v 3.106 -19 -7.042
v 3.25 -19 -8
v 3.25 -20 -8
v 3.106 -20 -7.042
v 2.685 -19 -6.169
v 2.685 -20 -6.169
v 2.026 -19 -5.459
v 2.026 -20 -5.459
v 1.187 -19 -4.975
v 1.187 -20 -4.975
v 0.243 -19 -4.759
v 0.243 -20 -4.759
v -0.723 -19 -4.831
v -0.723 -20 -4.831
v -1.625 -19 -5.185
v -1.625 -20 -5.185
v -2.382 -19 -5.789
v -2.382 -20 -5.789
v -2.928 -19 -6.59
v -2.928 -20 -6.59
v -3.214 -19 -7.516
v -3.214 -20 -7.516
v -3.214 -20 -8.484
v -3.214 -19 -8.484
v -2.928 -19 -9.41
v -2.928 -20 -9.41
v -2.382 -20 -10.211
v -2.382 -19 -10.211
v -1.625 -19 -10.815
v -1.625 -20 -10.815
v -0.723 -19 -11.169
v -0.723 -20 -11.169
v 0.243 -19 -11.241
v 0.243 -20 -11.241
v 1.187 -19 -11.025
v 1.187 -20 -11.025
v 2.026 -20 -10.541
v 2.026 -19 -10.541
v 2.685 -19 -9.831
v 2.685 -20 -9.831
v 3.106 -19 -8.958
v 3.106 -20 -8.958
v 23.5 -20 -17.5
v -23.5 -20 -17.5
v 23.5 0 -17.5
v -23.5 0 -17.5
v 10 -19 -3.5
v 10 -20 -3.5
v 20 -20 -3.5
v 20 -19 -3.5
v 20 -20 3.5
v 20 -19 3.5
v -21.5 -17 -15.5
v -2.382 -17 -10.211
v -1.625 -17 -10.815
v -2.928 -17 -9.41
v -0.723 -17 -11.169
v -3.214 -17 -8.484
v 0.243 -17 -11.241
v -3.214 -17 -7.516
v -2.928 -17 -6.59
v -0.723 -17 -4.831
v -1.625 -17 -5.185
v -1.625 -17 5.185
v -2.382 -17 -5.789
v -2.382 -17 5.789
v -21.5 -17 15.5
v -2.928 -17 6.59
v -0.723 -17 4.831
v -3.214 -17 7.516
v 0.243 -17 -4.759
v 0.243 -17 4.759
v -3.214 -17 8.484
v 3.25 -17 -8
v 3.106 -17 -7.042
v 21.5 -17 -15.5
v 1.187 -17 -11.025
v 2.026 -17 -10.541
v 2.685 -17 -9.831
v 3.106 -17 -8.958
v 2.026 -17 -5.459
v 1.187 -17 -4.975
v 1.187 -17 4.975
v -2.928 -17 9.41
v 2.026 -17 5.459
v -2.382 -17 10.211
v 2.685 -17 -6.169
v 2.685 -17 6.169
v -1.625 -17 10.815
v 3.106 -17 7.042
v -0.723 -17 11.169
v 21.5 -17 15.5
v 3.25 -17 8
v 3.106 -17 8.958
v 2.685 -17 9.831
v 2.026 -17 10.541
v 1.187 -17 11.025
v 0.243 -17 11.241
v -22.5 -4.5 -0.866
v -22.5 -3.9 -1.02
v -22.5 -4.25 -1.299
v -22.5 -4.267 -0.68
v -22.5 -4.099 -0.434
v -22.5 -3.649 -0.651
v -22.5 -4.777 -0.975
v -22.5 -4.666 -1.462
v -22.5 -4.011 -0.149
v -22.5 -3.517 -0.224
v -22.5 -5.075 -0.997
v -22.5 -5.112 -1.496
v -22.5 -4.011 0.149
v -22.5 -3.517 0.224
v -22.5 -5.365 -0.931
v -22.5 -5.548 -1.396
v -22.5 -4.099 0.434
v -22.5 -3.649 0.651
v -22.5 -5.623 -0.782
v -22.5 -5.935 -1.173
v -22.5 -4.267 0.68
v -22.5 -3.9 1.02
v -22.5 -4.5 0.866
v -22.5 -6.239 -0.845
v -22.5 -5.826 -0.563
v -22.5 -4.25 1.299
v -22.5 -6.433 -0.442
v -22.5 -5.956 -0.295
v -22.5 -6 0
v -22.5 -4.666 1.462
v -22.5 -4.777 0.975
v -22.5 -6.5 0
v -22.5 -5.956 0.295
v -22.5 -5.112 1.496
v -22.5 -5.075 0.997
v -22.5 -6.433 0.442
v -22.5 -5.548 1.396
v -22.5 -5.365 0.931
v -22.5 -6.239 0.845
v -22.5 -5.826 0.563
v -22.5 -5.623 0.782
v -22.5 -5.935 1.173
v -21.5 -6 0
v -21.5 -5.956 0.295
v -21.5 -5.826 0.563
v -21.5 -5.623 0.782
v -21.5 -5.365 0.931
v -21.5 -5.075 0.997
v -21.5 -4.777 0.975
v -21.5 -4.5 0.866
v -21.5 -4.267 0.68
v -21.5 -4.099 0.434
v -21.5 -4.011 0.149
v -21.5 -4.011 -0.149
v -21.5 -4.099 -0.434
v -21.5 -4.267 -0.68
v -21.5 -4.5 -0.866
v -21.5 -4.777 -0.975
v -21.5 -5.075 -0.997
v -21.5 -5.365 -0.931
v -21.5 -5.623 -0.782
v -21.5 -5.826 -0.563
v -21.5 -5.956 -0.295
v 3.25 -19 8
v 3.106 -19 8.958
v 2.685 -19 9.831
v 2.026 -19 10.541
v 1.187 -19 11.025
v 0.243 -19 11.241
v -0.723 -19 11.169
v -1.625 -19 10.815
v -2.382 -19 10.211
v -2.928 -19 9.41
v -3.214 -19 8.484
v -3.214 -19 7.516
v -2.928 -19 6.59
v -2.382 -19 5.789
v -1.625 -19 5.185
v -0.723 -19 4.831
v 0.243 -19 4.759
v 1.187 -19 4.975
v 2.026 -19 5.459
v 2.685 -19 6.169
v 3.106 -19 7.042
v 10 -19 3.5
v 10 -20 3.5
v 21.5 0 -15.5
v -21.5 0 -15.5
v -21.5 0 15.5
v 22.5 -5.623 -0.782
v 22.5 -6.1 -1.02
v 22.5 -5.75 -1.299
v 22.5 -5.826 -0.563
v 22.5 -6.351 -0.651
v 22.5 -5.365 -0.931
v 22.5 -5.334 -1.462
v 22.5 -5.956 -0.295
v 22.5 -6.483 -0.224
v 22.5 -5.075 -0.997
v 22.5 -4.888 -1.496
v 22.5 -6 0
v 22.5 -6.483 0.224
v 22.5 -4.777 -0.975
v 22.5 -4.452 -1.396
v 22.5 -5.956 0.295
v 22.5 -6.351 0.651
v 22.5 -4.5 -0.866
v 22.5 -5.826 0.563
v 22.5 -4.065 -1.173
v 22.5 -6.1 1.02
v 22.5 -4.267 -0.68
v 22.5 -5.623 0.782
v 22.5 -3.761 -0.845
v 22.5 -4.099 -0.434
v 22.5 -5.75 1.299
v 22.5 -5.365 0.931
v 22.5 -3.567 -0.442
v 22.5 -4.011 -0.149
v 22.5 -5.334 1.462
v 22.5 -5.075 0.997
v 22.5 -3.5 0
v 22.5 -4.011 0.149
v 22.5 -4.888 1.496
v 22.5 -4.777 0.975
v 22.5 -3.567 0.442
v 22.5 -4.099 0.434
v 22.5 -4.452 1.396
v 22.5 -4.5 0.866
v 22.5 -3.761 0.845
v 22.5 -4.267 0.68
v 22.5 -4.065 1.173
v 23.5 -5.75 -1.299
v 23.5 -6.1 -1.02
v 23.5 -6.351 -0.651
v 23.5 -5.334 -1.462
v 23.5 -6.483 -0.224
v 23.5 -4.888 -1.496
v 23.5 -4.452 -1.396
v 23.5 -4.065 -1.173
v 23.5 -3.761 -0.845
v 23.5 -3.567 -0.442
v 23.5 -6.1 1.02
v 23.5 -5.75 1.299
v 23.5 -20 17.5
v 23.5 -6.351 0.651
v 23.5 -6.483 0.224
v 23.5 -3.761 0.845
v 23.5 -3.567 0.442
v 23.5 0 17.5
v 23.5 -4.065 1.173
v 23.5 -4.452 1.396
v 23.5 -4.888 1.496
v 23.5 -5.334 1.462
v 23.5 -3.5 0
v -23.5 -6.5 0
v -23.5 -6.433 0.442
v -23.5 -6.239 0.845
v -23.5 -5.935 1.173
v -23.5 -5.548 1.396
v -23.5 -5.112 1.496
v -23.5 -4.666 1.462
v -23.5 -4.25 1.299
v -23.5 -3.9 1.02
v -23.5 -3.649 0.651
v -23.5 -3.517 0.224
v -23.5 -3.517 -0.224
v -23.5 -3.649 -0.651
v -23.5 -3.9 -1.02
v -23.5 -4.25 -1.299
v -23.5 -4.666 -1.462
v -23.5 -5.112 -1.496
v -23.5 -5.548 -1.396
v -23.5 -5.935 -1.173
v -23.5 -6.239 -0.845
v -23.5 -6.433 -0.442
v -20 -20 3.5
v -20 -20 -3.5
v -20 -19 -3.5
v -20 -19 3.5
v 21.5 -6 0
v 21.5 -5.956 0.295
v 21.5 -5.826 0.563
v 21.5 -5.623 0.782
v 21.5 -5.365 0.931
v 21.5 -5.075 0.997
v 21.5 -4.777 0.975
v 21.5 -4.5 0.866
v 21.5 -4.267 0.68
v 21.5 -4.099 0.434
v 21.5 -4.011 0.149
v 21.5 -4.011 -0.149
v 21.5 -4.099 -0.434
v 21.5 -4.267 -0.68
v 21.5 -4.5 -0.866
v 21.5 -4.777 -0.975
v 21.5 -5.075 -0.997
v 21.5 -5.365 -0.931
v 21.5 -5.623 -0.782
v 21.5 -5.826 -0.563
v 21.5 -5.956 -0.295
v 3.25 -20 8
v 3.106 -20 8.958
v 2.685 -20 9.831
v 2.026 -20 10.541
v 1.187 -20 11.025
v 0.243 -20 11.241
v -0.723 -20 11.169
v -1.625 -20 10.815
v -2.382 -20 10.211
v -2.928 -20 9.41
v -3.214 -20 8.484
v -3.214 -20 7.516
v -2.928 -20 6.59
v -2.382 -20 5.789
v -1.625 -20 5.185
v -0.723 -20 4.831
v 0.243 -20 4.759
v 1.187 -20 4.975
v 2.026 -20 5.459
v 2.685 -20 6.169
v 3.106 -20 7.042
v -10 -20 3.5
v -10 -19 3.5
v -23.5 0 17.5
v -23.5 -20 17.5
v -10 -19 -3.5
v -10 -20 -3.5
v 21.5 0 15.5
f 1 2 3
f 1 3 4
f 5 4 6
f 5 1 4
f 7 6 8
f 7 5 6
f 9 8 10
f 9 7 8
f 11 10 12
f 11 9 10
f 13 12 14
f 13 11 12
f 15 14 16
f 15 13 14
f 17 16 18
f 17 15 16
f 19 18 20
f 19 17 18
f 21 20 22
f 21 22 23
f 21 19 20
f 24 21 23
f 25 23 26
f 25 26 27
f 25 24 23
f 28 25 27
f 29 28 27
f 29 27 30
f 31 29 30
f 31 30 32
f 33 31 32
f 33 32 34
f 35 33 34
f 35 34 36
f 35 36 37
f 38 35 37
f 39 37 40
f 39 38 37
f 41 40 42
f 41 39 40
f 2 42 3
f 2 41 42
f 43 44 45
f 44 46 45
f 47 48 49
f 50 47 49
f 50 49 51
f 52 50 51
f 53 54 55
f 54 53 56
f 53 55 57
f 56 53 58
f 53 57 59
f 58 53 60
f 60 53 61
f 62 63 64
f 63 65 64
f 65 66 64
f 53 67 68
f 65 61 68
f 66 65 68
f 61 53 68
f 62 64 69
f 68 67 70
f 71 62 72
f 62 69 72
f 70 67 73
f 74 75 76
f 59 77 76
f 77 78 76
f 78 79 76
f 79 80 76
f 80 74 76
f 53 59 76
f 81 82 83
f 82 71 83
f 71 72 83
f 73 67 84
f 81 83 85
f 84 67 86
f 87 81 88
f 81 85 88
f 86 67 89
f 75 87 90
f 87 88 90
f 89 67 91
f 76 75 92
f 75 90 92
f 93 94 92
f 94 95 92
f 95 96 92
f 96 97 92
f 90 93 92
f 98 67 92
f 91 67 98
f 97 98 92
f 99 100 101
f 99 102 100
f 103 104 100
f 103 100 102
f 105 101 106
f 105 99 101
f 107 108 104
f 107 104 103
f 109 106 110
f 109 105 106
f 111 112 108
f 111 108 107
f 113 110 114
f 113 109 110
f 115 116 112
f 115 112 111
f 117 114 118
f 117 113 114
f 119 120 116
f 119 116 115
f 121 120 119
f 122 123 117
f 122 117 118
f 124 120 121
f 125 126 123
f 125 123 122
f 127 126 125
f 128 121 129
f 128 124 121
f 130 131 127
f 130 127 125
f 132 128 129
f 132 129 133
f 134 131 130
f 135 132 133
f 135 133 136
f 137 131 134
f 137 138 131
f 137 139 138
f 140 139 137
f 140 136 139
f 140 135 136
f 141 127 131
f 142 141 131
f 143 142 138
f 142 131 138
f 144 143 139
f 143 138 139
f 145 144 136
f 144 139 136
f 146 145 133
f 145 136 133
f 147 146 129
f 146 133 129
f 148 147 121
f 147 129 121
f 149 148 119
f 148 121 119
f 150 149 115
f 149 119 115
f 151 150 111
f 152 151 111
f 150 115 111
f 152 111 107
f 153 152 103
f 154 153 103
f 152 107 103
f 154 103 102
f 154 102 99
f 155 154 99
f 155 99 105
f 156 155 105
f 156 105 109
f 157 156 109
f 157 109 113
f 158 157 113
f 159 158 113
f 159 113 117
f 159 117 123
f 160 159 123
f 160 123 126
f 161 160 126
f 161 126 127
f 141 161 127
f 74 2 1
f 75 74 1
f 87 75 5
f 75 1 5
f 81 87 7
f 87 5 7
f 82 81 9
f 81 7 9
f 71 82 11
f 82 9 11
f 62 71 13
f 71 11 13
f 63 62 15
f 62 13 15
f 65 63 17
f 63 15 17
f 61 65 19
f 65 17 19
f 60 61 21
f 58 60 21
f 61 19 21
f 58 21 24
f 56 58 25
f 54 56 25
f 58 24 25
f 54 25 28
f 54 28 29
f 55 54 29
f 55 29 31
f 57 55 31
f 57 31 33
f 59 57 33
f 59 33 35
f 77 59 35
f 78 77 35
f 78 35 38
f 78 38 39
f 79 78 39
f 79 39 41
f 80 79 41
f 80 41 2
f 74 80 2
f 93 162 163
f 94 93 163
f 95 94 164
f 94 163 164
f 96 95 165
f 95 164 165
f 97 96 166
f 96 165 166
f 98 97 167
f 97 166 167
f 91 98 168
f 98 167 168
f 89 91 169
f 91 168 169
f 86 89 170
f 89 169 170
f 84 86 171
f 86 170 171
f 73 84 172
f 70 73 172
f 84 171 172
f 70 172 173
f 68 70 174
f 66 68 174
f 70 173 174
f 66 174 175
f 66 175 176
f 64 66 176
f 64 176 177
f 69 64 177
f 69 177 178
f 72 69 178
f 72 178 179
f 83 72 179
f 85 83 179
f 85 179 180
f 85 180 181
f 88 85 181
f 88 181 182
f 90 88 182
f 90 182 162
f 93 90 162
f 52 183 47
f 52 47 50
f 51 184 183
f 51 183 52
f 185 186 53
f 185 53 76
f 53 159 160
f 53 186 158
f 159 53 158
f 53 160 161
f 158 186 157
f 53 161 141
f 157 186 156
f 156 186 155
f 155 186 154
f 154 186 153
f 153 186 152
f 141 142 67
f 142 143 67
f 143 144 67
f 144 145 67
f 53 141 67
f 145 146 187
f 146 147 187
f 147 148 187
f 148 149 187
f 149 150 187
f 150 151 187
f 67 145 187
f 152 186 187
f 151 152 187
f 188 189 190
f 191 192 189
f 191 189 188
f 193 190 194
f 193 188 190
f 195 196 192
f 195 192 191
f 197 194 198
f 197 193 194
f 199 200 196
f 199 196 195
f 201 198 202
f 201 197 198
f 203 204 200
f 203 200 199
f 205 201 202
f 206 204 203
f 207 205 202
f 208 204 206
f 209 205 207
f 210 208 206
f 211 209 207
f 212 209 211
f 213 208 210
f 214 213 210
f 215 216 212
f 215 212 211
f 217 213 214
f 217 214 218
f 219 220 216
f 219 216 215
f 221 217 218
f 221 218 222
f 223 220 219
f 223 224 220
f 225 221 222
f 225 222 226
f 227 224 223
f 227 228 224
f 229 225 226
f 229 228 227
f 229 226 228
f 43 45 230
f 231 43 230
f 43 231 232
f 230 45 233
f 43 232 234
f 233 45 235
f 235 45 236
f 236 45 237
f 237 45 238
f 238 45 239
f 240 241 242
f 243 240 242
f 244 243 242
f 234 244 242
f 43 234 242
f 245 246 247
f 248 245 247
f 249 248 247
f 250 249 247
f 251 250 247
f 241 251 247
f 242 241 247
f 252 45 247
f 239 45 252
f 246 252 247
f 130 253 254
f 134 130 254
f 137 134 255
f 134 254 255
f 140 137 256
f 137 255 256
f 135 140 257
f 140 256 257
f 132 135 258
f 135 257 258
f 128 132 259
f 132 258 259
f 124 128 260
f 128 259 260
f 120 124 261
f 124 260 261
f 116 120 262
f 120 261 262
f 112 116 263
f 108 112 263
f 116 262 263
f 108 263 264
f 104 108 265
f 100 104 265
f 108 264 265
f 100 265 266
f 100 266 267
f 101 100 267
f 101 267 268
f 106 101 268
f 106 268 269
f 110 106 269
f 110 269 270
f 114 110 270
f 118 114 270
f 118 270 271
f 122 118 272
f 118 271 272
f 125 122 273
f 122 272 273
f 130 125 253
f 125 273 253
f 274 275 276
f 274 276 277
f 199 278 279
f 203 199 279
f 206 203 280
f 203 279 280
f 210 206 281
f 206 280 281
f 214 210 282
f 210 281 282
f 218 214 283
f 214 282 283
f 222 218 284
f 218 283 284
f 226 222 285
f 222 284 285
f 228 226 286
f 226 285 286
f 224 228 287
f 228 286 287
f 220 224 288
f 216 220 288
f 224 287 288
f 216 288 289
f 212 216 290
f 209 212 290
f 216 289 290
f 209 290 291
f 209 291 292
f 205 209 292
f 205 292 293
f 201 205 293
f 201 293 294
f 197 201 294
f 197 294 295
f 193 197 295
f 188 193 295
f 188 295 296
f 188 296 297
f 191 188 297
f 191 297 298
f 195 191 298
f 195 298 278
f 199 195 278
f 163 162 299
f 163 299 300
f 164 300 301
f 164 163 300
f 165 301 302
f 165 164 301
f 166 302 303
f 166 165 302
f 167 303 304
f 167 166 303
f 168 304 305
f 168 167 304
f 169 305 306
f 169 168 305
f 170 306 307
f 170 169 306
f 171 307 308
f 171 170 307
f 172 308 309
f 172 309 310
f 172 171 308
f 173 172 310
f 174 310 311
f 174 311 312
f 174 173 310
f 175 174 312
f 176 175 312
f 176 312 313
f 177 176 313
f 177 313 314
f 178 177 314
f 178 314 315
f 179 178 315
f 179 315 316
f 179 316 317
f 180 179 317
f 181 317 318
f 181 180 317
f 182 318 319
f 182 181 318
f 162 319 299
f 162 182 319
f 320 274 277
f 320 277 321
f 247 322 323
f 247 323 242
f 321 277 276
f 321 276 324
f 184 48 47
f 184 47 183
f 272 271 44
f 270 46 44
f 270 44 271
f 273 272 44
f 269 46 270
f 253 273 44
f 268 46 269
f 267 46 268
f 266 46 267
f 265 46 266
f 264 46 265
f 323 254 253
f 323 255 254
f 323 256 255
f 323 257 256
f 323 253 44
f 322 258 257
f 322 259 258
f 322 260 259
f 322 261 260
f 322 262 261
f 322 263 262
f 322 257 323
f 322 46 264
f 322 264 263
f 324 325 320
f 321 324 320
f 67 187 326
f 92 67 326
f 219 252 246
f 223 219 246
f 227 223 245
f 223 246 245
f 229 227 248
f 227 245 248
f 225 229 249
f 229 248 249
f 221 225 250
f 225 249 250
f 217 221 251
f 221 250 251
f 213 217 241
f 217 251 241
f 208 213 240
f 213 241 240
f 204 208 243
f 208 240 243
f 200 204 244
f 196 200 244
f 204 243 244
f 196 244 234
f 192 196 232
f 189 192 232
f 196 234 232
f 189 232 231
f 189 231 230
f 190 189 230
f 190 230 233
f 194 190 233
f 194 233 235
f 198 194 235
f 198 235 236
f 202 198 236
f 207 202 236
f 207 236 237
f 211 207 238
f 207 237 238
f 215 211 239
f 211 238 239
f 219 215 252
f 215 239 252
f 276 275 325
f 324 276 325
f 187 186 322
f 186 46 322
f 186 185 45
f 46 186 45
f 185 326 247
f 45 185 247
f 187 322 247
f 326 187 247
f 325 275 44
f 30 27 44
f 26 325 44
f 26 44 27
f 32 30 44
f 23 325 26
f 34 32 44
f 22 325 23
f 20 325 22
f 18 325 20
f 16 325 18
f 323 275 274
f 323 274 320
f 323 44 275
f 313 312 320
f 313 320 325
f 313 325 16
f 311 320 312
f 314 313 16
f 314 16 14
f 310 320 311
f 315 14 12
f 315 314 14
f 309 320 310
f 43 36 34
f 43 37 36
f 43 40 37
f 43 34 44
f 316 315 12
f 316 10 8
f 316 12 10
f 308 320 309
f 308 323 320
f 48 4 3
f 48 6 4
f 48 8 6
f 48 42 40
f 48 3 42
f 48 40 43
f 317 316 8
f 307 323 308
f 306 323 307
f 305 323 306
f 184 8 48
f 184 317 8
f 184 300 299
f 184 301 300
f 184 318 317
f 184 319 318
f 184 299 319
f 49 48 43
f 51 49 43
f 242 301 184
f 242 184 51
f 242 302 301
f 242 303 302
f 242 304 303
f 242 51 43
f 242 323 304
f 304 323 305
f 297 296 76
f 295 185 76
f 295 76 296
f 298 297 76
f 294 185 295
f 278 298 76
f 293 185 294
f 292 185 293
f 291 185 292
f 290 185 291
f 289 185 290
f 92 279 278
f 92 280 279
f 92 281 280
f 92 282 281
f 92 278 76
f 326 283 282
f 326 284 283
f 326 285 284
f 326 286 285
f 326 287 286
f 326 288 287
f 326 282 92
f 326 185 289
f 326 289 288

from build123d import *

# Parameters (mm, degrees)
F0_W      = 47
F0_H      = 35
F1_DEPTH  = 19
F2_T      = -2
F3_R      = 3.25
F4_DEPTH  = 19.001
F1_FACE_W = 47
F1_FACE_H = 35
F1_FACE_R = 3.25
F5_DEPTH  = 1
F7_R      = 1
F8_DEPTH  = 47.001
F9_R      = 1.5
F10_DEPTH = 1
F11_R     = 1.5
F12_DEPTH = 1
F13_W     = 10
F13_H     = 7
F14_DEPTH = 1


with BuildPart() as f1:
    # F0 (on Front) → F1 (new body)
    with BuildSketch(Plane.XZ):
        Rectangle(F0_W, F0_H)
    extrude(amount=F1_DEPTH)

    # F2
    f2_openings = [f1.faces().sort_by_distance(p)[0] for p in [
        (0, 0, 0),
    ]]
    offset(amount=F2_T, openings=f2_openings)

    # F3 (on face) → F4 (cut, through all)
    with BuildSketch(Plane.XZ.offset(19)):
        with Locations((0, 8)):
            Circle(F3_R)
        with Locations((0, -8)):
            Circle(F3_R)
    extrude(amount=-F4_DEPTH, mode=Mode.SUBTRACT)

    # F1_face (on face) → F5 (join)
    with BuildSketch(Plane.XZ.offset(19)):
        Rectangle(F1_FACE_W, F1_FACE_H)
        with Locations((0, -8)):
            Circle(F1_FACE_R, mode=Mode.SUBTRACT)
        with Locations((0, 8)):
            Circle(F1_FACE_R, mode=Mode.SUBTRACT)
    extrude(amount=F5_DEPTH)

    # F7 (on face) → F8 (cut, through all)
    with BuildSketch(Plane(origin=(-23.5, 0, 0), x_dir=(0, -1, 0), z_dir=(-1, 0, 0))):
        with Locations((5, 0)):
            Circle(F7_R)
    extrude(amount=-F8_DEPTH, mode=Mode.SUBTRACT)

    # F9 (on face) → F10 (cut)
    with BuildSketch(Plane(origin=(-23.5, 0, 0), x_dir=(0, -1, 0), z_dir=(-1, 0, 0))):
        with Locations((5, 0)):
            Circle(F9_R)
    extrude(amount=-F10_DEPTH, mode=Mode.SUBTRACT)

    # F11 (on face) → F12 (cut)
    with BuildSketch(Plane.YZ.offset(23.5)):
        with Locations((-5, 0)):
            Circle(F11_R)
    extrude(amount=-F12_DEPTH, mode=Mode.SUBTRACT)

    # F13 (on face) → F14 (cut)
    with BuildSketch(Plane.XZ.offset(20)):
        with Locations((-15, 0)):
            Rectangle(F13_W, F13_H)
        with Locations((15, 0)):
            Rectangle(F13_W, F13_H)
    extrude(amount=-F14_DEPTH, mode=Mode.SUBTRACT)


solid = f1.part
